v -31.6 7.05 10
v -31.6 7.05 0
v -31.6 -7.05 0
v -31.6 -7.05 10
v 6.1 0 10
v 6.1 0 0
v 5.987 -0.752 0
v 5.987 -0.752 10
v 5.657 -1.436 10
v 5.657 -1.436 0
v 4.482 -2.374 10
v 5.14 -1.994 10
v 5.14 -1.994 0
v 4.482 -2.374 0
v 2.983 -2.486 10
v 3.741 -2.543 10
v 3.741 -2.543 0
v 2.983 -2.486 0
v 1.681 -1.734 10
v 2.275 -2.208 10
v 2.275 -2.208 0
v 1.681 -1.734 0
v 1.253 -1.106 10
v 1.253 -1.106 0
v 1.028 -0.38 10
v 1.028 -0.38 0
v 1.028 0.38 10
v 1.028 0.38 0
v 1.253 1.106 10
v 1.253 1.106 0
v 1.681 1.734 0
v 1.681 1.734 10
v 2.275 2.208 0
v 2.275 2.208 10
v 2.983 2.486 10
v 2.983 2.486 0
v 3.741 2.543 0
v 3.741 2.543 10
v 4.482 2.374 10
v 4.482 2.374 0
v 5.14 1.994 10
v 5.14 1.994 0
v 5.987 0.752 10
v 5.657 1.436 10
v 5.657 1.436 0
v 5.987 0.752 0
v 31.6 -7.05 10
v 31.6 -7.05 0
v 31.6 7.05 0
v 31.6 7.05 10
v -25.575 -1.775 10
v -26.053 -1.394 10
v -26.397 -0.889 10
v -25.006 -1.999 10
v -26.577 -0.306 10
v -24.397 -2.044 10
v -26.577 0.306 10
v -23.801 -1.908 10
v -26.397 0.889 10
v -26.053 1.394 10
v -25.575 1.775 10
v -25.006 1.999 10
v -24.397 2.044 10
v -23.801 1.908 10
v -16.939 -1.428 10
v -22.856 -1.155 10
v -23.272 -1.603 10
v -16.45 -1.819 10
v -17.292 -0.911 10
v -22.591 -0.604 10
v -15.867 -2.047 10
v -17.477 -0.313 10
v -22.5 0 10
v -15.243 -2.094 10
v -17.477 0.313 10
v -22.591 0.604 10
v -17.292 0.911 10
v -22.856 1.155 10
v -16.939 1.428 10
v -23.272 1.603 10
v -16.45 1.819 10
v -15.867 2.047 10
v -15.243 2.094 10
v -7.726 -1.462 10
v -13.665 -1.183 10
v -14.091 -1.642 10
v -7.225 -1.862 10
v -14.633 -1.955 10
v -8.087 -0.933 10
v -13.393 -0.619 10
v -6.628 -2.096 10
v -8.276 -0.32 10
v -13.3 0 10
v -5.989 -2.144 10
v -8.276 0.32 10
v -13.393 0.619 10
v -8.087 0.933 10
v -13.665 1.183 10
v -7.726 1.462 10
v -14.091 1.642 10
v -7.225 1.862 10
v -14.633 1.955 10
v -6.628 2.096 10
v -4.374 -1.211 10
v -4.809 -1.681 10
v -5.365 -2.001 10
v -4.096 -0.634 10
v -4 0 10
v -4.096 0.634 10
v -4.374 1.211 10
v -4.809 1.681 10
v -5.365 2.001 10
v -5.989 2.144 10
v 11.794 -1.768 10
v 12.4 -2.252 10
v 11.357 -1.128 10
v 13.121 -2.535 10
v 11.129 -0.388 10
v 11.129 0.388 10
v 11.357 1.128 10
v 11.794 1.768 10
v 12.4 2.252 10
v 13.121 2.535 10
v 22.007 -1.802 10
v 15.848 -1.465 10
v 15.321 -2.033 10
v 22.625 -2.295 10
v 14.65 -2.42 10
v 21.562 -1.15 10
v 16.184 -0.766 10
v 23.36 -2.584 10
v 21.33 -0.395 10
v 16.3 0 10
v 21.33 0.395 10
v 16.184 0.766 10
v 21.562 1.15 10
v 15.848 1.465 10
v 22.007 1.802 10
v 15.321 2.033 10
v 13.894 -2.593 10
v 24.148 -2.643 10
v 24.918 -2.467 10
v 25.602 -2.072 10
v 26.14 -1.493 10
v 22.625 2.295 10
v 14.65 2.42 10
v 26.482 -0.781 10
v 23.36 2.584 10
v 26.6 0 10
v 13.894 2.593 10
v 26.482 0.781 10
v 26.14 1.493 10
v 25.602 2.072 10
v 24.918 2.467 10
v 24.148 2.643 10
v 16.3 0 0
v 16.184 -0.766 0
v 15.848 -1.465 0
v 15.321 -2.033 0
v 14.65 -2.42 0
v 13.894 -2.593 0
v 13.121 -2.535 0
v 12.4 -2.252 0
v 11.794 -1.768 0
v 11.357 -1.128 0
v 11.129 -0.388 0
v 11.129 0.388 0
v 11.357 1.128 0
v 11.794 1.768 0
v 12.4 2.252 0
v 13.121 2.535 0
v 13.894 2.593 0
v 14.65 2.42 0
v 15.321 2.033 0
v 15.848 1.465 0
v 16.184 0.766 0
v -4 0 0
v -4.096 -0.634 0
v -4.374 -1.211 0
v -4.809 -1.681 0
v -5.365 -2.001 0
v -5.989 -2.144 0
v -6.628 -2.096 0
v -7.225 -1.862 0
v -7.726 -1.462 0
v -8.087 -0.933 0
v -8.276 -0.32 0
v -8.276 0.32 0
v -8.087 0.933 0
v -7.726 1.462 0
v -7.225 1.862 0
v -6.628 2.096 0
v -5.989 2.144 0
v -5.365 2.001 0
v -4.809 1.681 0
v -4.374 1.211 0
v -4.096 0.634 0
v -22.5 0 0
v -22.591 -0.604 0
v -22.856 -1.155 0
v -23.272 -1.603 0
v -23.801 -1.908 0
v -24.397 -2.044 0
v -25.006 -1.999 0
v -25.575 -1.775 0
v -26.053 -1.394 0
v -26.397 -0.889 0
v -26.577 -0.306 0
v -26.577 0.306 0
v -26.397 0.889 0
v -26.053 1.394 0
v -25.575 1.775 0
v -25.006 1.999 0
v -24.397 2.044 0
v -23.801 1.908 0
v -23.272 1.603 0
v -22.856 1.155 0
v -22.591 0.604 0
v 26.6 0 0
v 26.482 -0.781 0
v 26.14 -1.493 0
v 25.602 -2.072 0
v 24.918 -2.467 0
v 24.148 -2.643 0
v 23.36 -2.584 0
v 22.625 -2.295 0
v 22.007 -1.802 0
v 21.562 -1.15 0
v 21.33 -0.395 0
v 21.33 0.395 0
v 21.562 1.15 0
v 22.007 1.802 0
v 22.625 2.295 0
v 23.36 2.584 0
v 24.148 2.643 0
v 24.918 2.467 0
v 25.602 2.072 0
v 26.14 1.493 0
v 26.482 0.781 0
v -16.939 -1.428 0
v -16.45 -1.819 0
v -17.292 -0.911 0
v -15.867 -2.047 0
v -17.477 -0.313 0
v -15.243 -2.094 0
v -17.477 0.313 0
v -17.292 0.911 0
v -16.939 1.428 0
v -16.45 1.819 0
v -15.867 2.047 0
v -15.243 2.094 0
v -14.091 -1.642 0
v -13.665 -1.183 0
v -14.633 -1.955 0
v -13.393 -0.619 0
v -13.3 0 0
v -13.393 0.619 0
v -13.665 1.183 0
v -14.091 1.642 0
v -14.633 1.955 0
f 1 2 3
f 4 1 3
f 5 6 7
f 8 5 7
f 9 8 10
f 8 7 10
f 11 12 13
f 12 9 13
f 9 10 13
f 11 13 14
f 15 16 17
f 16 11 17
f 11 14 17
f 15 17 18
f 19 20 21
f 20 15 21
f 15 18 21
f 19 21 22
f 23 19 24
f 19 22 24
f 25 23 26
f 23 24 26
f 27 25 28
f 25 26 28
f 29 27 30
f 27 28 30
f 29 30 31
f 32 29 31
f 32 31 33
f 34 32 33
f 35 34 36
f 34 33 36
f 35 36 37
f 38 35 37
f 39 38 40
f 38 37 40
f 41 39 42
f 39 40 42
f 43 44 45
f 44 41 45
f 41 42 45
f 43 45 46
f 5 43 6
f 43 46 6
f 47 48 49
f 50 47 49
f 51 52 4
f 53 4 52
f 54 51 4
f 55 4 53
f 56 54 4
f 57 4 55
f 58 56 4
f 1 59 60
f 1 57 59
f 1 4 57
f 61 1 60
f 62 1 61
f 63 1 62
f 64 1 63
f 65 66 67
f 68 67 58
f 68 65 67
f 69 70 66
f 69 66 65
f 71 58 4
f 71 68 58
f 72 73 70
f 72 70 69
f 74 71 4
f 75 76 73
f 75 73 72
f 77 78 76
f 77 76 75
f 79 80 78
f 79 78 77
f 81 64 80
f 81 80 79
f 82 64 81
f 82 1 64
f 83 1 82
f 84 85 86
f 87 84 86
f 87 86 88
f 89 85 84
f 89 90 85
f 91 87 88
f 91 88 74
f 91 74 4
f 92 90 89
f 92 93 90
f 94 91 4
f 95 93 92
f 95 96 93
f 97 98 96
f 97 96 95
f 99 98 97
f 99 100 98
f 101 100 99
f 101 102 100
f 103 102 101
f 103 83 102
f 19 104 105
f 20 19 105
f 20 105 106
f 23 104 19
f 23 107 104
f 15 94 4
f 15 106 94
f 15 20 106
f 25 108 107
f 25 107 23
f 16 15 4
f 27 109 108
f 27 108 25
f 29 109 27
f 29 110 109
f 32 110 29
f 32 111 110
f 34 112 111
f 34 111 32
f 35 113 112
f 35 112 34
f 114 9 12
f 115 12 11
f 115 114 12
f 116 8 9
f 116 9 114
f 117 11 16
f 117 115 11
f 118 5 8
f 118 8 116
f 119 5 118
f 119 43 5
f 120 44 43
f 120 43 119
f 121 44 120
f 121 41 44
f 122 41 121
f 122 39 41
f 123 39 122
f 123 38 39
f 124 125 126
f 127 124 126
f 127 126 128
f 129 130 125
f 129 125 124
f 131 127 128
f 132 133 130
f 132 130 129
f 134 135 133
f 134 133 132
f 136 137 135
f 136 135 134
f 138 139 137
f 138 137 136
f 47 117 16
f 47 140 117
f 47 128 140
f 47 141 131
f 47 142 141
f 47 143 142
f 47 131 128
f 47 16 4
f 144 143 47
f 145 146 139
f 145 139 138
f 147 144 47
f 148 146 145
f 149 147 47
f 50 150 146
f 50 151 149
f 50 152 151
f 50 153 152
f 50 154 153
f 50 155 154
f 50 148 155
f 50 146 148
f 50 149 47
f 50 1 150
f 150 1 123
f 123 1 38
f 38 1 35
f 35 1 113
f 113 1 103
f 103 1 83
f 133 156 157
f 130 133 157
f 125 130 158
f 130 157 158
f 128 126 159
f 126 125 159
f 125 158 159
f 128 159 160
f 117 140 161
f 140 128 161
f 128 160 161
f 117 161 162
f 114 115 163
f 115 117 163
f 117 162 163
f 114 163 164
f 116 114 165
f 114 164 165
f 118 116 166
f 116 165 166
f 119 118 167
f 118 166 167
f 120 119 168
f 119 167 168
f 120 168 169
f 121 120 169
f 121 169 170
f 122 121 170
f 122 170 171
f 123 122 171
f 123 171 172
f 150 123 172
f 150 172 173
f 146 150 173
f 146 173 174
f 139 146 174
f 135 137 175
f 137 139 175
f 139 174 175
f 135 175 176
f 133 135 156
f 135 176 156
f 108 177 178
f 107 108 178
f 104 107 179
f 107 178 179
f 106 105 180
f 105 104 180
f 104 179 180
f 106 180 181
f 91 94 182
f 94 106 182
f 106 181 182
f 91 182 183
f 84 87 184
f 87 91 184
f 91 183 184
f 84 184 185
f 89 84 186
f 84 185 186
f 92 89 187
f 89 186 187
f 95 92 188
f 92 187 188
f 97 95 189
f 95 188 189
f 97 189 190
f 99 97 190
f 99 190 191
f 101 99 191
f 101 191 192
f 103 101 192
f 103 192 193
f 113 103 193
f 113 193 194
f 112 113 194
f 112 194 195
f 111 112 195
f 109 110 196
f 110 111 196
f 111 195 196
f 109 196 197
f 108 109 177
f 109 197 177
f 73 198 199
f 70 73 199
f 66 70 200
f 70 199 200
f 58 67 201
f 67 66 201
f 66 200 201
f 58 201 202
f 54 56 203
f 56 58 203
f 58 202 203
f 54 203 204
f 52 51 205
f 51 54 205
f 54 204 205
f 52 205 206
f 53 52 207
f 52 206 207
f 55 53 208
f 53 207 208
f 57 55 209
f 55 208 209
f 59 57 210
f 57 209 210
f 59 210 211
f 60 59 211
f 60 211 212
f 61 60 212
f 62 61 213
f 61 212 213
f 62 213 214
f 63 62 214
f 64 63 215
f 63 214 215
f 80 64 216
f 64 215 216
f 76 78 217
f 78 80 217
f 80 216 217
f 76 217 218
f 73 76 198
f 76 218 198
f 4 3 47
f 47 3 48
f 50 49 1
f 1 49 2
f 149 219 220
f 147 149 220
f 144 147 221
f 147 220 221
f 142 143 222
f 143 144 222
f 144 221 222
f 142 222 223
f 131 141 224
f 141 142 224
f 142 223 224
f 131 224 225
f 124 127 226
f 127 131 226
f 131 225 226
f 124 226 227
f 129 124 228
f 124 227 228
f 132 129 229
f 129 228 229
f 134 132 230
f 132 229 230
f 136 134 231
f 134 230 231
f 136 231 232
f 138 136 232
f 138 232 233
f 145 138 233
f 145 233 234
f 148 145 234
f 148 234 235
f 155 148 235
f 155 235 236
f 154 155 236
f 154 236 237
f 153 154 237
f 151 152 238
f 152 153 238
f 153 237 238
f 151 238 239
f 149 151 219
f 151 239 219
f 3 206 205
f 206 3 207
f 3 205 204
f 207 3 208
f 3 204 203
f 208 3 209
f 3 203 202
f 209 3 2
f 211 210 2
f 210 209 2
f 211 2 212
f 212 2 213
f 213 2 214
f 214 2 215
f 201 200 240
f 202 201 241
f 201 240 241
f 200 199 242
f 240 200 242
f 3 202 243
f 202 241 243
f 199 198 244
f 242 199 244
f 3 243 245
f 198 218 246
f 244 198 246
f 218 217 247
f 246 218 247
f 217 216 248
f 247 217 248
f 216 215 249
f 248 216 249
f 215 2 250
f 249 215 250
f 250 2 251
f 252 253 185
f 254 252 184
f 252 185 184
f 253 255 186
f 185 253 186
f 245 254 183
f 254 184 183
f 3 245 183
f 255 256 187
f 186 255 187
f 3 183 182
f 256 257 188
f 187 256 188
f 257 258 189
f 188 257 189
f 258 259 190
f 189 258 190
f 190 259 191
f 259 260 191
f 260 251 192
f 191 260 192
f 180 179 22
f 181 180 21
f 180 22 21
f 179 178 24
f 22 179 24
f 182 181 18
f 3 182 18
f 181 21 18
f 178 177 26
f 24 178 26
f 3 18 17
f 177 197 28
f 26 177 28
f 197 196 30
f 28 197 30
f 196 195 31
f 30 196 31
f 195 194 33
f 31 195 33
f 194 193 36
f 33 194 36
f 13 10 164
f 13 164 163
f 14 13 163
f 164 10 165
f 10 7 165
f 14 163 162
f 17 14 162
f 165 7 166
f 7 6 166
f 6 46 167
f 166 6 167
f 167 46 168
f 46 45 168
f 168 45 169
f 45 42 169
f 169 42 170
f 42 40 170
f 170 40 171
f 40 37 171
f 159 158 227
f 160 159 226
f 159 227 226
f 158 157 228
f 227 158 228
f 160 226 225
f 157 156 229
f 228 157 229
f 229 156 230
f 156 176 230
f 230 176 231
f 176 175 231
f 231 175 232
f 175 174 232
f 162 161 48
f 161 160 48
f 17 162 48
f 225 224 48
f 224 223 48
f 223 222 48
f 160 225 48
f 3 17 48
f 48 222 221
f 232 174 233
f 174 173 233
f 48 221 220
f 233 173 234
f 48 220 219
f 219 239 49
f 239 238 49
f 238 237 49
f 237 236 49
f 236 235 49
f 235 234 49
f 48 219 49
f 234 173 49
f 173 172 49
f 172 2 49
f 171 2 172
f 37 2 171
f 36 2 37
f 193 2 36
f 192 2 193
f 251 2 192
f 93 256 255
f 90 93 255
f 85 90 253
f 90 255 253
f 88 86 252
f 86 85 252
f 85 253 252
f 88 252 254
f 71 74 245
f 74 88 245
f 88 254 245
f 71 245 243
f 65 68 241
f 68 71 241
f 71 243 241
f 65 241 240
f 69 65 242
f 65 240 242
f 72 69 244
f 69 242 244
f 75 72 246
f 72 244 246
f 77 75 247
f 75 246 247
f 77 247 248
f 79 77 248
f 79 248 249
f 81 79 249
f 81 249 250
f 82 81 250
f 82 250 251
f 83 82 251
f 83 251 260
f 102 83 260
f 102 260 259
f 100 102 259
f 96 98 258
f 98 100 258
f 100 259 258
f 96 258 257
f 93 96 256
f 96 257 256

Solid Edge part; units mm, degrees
sketch "Sketch1" plane through (0, 0, 0) normal (0, 0, 1) x (1, 0, 0)
  line L0 (-31.6, -7.05) -> (31.6, -7.05)
  line L1 (31.6, -7.05) -> (31.6, 7.05)
  line L2 (31.6, 7.05) -> (-31.6, 7.05)
  line L3 (-31.6, 7.05) -> (-31.6, -7.05)
  circle A0 centre (-24.55, 0) radius 2.05
  circle A1 centre (-15.4, 0) radius 2.1
  circle A2 centre (-6.15, 0) radius 2.15
  circle A3 centre (3.55, 0) radius 2.55
  circle A4 centre (13.7, 0) radius 2.6
  circle A5 centre (23.95, 0) radius 2.65
  dimension "D1" = 5
  dimension "D2" = 5
  dimension "D3" = 5
  dimension "D4" = 5
  dimension "D5" = 4.3
  dimension "D6" = 5.1
  dimension "D7" = 5
  dimension "D8" = 5
  dimension "D9" = 5.2
  dimension "D10" = 5
  dimension "D11" = 5
  dimension "D12" = 5.3
extrude "Protrusion1" add sketch "Sketch1" along normal blind 10
